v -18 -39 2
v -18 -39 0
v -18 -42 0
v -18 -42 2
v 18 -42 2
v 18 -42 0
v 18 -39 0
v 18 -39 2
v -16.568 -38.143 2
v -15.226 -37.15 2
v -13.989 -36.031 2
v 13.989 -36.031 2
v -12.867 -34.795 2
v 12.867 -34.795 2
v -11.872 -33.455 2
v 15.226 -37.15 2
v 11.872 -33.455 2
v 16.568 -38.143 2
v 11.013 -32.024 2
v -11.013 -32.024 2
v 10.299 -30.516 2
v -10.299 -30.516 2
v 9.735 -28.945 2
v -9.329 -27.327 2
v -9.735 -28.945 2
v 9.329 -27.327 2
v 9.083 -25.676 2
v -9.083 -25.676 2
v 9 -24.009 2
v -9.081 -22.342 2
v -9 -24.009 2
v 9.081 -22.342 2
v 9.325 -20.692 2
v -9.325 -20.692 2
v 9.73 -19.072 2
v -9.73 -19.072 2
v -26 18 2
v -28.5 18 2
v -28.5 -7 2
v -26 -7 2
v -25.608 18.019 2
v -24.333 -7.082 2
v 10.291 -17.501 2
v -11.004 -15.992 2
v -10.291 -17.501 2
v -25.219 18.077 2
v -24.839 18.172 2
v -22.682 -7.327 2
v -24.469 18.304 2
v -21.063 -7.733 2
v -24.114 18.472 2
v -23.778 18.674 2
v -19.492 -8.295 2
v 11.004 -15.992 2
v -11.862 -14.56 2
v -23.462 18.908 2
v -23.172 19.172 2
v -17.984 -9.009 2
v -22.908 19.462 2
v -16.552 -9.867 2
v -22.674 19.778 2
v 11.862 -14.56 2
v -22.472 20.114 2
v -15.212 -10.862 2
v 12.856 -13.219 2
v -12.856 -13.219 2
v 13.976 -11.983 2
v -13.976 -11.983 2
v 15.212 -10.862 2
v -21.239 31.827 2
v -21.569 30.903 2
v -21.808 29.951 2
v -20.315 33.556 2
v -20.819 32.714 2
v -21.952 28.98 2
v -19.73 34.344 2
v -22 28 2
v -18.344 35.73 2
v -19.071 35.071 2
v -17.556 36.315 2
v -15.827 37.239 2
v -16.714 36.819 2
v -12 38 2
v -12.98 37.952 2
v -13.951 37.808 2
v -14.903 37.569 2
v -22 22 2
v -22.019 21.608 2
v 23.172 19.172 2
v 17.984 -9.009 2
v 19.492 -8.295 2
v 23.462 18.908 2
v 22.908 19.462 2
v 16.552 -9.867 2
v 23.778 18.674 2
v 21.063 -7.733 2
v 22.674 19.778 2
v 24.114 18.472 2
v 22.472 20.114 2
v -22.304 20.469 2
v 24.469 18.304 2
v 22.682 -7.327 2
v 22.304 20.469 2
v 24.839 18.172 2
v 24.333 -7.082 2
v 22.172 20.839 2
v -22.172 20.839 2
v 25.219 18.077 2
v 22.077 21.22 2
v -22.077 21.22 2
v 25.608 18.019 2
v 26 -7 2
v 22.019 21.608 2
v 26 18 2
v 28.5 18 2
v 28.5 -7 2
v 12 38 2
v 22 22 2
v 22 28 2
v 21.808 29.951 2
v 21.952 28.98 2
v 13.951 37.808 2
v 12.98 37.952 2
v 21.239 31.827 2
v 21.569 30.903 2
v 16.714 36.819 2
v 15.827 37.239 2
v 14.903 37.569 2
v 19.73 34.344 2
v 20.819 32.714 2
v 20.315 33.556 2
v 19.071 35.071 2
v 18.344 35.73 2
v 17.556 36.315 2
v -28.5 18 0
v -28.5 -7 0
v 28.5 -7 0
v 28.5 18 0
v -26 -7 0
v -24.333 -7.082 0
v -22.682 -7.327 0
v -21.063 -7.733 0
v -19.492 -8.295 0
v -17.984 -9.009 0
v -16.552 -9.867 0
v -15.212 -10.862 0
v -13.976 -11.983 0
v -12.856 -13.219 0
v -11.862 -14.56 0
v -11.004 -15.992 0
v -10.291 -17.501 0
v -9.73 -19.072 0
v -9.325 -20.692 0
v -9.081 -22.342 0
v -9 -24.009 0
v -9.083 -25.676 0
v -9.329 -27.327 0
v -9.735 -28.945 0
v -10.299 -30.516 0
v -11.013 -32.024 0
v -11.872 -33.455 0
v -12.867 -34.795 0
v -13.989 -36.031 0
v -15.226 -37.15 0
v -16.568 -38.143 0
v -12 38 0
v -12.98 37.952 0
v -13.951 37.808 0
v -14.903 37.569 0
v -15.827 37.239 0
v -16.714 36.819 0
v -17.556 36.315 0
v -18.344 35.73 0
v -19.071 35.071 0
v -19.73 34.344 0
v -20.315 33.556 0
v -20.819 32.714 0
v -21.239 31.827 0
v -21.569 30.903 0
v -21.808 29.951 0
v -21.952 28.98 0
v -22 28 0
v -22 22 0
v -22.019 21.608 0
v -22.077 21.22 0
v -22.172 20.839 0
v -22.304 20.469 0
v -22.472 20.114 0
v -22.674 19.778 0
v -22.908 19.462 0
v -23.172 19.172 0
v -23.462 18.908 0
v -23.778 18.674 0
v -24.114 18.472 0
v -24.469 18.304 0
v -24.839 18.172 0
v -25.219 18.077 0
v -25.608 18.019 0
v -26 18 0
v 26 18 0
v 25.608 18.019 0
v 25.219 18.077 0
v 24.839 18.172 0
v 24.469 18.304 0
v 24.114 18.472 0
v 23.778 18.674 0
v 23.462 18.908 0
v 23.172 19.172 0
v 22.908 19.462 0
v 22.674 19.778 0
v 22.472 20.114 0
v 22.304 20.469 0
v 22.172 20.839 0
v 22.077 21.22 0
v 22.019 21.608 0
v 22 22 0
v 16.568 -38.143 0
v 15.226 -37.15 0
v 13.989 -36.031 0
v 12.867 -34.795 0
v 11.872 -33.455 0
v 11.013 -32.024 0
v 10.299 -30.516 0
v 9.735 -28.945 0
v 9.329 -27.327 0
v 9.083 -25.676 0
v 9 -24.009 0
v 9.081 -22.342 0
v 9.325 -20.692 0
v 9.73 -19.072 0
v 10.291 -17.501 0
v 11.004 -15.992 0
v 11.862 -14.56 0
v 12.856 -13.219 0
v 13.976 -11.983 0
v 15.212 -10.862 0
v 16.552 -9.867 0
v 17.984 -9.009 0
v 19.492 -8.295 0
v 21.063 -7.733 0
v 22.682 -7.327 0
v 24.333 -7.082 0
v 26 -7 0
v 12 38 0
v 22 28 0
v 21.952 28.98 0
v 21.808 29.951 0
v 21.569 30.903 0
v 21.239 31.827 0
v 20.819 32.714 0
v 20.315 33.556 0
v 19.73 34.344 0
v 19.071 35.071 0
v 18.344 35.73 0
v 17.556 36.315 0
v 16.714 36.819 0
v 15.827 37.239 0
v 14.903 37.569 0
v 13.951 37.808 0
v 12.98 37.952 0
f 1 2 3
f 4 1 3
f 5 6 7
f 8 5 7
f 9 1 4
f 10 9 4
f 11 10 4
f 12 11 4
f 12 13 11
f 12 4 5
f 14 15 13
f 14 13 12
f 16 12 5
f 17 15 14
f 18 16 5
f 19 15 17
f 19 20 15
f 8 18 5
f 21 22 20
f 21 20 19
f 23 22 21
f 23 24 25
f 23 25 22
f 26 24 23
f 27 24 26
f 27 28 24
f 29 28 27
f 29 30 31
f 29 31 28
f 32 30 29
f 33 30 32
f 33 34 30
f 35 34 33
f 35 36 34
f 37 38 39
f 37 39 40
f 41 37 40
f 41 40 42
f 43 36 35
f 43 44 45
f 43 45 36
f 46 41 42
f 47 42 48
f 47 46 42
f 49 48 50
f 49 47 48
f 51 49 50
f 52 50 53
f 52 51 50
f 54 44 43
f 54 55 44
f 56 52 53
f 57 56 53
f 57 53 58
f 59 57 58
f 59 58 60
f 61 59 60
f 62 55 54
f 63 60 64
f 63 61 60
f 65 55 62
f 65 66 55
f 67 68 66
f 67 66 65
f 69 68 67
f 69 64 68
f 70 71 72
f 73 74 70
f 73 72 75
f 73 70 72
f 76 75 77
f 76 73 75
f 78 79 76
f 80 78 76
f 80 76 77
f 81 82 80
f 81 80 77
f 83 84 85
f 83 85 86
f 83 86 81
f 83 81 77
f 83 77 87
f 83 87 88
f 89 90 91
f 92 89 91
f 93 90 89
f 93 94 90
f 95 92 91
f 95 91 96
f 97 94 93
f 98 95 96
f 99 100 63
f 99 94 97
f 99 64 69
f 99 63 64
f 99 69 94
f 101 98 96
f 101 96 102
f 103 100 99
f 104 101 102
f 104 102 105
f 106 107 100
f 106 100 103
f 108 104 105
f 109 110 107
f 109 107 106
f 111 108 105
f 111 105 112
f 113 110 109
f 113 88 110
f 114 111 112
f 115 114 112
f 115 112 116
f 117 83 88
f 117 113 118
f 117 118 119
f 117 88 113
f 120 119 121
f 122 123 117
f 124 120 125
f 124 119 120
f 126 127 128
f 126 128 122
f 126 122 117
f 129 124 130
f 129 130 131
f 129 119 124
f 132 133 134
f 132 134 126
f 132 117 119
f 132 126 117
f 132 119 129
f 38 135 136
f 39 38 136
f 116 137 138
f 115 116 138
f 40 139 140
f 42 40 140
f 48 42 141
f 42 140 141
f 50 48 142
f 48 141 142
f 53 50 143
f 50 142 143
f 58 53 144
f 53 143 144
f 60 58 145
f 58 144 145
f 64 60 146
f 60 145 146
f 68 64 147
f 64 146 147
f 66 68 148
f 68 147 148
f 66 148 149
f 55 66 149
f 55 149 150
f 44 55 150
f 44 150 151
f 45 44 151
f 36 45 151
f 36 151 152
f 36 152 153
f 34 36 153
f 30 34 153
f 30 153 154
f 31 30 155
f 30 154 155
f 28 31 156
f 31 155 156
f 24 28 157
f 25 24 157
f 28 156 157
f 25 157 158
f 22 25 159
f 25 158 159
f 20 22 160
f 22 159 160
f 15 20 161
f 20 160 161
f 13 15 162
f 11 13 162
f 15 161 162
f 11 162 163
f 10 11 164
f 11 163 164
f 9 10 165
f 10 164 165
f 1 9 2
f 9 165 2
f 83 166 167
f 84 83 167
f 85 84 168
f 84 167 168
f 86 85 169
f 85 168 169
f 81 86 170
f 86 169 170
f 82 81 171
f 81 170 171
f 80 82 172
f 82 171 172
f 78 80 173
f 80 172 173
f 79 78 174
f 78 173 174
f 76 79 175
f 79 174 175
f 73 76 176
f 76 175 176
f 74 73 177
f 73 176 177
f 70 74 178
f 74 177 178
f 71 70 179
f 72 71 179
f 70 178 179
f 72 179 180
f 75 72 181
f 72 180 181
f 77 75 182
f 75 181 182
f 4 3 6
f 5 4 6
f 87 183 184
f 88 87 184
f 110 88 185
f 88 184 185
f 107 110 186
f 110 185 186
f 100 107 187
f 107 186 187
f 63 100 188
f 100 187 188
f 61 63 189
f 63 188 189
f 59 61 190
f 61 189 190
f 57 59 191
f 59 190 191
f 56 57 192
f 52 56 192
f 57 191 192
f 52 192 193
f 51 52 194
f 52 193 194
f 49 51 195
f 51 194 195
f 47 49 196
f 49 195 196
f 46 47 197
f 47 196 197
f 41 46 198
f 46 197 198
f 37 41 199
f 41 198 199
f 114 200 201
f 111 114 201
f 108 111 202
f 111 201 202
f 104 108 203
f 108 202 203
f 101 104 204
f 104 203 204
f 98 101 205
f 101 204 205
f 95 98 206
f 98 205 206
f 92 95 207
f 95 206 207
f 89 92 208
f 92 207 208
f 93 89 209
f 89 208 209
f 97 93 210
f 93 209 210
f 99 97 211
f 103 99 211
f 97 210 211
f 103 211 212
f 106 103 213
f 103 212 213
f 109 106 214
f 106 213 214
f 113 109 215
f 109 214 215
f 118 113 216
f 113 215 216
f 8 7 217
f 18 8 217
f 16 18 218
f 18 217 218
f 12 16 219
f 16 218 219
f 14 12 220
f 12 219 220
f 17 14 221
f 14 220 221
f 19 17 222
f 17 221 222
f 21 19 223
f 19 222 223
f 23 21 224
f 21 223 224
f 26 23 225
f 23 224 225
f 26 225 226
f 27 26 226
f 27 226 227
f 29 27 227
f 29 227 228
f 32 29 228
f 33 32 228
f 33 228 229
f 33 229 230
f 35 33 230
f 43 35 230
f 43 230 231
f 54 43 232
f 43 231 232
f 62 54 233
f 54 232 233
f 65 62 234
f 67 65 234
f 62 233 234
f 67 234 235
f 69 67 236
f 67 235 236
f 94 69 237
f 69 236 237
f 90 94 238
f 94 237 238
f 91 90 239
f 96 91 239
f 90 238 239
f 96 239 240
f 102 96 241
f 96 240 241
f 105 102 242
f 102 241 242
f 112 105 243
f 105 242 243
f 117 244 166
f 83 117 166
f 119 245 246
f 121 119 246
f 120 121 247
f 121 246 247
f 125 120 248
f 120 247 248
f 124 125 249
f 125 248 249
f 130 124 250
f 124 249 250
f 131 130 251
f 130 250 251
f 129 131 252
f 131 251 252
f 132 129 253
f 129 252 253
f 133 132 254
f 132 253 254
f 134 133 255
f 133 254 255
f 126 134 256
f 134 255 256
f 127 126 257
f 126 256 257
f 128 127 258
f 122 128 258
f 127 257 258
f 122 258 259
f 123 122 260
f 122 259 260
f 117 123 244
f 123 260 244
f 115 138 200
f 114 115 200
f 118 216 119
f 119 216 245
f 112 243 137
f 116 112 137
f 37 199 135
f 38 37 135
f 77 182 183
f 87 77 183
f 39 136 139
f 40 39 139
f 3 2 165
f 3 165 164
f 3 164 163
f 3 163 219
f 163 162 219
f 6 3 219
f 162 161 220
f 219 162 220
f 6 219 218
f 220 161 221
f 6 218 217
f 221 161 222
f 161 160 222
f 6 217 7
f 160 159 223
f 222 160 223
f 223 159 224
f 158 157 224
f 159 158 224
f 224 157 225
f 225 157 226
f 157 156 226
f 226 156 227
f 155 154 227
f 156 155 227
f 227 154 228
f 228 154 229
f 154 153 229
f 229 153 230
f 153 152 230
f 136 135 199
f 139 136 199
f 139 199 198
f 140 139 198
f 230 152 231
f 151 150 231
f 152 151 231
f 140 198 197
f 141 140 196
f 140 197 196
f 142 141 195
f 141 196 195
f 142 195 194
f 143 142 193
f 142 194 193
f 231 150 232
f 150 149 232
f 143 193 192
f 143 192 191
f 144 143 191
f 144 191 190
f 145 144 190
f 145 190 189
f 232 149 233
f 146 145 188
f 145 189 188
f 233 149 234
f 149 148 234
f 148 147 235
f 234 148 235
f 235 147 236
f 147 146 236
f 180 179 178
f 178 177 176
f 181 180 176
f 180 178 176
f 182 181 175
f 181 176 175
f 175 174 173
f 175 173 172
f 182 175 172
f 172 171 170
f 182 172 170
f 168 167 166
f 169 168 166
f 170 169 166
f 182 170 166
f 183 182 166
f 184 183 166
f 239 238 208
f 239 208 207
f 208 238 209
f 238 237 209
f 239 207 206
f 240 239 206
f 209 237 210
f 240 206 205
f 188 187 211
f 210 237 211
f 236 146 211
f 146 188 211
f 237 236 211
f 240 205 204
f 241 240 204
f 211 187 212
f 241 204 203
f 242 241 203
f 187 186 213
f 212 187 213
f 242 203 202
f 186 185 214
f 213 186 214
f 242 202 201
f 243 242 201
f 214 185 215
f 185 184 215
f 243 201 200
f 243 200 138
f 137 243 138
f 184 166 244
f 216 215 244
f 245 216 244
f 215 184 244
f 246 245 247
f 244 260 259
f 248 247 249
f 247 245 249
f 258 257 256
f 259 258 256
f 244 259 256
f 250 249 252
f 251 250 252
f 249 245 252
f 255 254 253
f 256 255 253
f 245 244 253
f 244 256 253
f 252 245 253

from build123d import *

# Parameters (mm, degrees)
F1_DEPTH = 2


with BuildPart() as f1:
    # F0 (on Top) → F1 (new body)
    with BuildSketch(Plane.XY):
        with BuildLine():
            Line((12, 38), (0, 38))
            Line((0, 38), (-12, 38))
            ThreePointArc((-12, 38), (-19.071081, 35.071055), (-22, 27.999963))
            Line((-22, 27.999963), (-22, 21.999963))
            ThreePointArc((-22, 21.999963), (-23.171507, 19.171602), (-25.999815, 17.999963))
            Line((-25.999815, 17.999963), (-28.499815, 17.999963))
            Line((-28.499815, 17.999963), (-28.499815, -7.000037))
            Line((-28.499815, -7.000037), (-25.999815, -7.000037))
            ThreePointArc((-25.999815, -7.000037), (-9.507625, -19.877017), (-18, -39))
            Line((-18, -39), (-18, -42))
            Line((-18, -42), (0, -42))
            Line((0, -42), (18, -42))
            Line((18, -42), (18, -39))
            ThreePointArc((18, -39), (9.507625, -19.877017), (25.999815, -7.000037))
            Line((25.999815, -7.000037), (28.499815, -7.000037))
            Line((28.499815, -7.000037), (28.499815, 17.999963))
            Line((28.499815, 17.999963), (25.999815, 17.999963))
            ThreePointArc((25.999815, 17.999963), (23.171507, 19.171602), (22, 21.999963))
            Line((22, 21.999963), (22, 27.999963))
            ThreePointArc((22, 27.999963), (19.071081, 35.071055), (12, 38))
        make_face()
    extrude(amount=F1_DEPTH)


solid = f1.part
